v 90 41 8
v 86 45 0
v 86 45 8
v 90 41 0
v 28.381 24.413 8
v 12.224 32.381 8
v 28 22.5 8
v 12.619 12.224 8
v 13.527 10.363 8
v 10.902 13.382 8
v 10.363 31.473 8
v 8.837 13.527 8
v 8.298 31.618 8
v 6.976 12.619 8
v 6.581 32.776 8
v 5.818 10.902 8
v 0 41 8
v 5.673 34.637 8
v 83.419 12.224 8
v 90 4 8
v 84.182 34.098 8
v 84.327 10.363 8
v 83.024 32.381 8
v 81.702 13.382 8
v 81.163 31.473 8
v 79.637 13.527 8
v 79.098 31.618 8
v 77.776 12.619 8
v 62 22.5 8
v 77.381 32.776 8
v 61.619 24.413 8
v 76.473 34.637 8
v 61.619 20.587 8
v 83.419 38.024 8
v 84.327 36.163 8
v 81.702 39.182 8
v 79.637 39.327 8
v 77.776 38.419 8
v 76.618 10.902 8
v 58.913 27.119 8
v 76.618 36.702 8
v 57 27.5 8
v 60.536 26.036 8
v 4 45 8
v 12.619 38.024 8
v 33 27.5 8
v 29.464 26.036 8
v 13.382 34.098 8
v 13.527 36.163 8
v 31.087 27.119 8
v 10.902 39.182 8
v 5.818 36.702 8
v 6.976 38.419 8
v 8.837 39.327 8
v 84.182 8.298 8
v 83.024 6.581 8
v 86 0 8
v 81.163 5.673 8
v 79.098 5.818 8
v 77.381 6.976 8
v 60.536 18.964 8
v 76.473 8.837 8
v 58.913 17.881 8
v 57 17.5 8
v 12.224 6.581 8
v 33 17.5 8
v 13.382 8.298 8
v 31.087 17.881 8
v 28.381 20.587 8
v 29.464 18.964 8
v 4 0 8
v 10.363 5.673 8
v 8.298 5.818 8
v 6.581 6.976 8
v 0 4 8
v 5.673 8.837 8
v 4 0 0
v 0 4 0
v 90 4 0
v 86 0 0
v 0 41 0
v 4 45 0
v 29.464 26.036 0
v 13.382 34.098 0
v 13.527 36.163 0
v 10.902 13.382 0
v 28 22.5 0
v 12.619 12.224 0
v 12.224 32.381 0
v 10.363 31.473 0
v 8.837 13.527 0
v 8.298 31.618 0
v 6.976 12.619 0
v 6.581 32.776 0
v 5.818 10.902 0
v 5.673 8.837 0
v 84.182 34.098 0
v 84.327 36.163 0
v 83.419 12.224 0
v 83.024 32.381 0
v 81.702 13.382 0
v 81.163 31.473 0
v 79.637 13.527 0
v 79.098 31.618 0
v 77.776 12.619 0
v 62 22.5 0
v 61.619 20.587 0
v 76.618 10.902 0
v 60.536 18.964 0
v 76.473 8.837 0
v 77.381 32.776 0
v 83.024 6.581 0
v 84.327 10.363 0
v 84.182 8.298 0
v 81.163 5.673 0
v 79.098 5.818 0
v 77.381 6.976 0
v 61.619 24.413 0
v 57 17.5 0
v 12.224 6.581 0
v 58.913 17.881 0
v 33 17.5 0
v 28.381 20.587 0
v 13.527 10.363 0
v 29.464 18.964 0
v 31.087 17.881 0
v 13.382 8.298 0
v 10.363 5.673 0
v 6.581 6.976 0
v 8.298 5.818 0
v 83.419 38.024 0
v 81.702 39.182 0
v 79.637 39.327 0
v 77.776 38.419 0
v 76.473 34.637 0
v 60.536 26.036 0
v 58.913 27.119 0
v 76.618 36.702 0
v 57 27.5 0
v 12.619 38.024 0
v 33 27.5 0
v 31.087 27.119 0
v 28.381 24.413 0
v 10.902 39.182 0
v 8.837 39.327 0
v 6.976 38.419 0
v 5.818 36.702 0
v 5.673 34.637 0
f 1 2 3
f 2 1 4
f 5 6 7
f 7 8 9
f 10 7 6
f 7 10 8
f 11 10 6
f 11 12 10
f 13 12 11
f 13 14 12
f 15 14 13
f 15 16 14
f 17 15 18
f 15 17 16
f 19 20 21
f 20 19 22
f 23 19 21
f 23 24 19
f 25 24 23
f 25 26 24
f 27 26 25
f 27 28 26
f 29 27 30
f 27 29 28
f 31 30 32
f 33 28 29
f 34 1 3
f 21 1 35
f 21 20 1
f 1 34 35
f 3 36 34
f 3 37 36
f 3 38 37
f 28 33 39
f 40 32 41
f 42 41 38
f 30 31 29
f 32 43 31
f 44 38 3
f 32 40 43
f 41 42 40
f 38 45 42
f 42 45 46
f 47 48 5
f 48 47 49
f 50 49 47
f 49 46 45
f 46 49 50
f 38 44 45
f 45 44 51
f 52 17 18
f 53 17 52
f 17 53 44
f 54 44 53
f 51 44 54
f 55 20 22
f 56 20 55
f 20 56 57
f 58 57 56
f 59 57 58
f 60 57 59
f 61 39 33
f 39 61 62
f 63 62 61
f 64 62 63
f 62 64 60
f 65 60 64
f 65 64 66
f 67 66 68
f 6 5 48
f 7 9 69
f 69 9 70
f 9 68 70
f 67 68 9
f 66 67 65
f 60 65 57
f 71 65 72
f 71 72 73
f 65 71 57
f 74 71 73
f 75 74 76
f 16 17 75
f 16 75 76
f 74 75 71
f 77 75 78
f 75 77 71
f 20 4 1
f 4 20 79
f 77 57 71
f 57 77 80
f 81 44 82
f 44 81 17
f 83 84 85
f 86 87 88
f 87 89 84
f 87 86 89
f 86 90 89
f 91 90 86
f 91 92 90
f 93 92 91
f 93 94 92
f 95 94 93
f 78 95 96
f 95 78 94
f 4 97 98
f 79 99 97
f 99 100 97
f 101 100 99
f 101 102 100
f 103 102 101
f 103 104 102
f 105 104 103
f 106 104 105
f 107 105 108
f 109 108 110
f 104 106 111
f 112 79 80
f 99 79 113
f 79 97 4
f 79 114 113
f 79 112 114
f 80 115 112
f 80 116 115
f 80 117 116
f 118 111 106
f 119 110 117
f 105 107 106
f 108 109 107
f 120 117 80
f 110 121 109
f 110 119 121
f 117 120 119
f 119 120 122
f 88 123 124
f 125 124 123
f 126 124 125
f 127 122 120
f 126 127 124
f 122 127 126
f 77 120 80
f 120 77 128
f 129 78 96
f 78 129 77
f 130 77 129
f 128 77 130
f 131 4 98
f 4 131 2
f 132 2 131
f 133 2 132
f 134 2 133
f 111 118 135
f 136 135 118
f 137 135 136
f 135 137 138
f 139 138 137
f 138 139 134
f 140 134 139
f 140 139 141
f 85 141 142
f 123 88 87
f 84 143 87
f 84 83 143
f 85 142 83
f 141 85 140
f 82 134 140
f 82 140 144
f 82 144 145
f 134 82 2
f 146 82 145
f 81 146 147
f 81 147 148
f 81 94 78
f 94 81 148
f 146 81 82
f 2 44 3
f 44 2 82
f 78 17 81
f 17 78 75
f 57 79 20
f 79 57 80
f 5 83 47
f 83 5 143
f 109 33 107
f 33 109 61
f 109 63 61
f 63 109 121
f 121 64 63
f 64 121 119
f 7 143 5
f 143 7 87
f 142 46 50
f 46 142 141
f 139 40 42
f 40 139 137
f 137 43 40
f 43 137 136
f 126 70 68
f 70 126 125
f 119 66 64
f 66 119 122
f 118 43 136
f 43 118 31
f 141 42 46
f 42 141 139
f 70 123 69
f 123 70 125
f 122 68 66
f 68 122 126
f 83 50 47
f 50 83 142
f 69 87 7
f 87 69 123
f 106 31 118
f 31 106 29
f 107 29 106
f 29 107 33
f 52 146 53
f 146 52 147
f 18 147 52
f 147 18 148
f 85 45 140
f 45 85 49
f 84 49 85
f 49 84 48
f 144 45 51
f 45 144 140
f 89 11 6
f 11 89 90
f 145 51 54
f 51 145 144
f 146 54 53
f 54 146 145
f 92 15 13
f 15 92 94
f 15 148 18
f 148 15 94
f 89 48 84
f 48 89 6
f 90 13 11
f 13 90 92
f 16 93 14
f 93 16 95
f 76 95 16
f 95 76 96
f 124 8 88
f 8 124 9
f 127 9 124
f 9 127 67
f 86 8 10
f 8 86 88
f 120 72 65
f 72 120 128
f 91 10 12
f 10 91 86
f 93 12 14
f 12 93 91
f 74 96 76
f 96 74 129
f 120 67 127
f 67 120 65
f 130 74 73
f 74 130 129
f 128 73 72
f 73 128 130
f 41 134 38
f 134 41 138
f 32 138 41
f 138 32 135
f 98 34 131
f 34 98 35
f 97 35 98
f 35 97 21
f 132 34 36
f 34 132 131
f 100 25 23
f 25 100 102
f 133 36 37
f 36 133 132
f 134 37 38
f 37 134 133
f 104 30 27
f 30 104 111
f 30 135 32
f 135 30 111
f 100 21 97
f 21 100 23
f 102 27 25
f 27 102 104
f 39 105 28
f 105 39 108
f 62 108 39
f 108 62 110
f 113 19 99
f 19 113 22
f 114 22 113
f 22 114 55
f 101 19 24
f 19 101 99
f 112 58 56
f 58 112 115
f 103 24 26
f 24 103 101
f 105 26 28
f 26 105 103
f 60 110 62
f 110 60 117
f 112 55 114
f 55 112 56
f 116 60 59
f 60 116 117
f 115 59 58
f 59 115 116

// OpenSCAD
$fn = 32;

// ----------------------------------------------------------------------
// Bracket plate: slot plate 90 x 45
// ----------------------------------------------------------------------

// --- parameters (mm) ---
hole_r = 4;               // bolt hole radius
plate_t = 8;              // plate thickness, Z (extrusion height)
plate_l = 90;             // plate length
plate_w = 45;             // plate width
slot_l = 24;              // slot straight length
slot_r = 5;               // slot end radius

slot_len = slot_l + 2 * slot_r;
slot_w = 2 * slot_r;
hole_d2 = 2 * hole_r;

profile = [[4, 0], [86, 0], [90, 4], [90, 41], [86, 45], [4, 45], [0, 41], [0, 4]];  // primary outline, 8 points, counter clockwise
void_1 = [[57, 17.5], [58.913, 17.881], [60.536, 18.964], [61.619, 20.587], [62, 22.5], [61.619, 24.413], [60.536, 26.036], [58.913, 27.119], [57, 27.5], [33, 27.5], [31.087, 27.119], [29.464, 26.036], [28.381, 24.413], [28, 22.5], [28.381, 20.587], [29.464, 18.964], [31.087, 17.881], [33, 17.5]];  // grip slot, 18 points
void_2 = [[13.527, 36.163], [12.619, 38.024], [10.902, 39.182], [8.837, 39.327], [6.976, 38.419], [5.818, 36.702], [5.673, 34.637], [6.581, 32.776], [8.298, 31.618], [10.363, 31.473], [12.224, 32.381], [13.382, 34.098]];  // corner hole, 12 points
void_3 = [[13.527, 10.363], [12.619, 12.224], [10.902, 13.382], [8.837, 13.527], [6.976, 12.619], [5.818, 10.902], [5.673, 8.837], [6.581, 6.976], [8.298, 5.818], [10.363, 5.673], [12.224, 6.581], [13.382, 8.298]];  // corner hole, 12 points
void_4 = [[84.327, 36.163], [83.419, 38.024], [81.702, 39.182], [79.637, 39.327], [77.776, 38.419], [76.618, 36.702], [76.473, 34.637], [77.381, 32.776], [79.098, 31.618], [81.163, 31.473], [83.024, 32.381], [84.182, 34.098]];  // corner hole, 12 points
void_5 = [[84.327, 10.363], [83.419, 12.224], [81.702, 13.382], [79.637, 13.527], [77.776, 12.619], [76.618, 10.902], [76.473, 8.837], [77.381, 6.976], [79.098, 5.818], [81.163, 5.673], [83.024, 6.581], [84.182, 8.298]];  // corner hole, 12 points

// --- the one profile operation ---
difference() {
  linear_extrude(height = plate_t) polygon(points = profile);
  translate([0, 0, -1])
    linear_extrude(height = plate_t + 2) polygon(points = void_1);
  translate([0, 0, -1])
    linear_extrude(height = plate_t + 2) polygon(points = void_2);
  translate([0, 0, -1])
    linear_extrude(height = plate_t + 2) polygon(points = void_3);
  translate([0, 0, -1])
    linear_extrude(height = plate_t + 2) polygon(points = void_4);
  translate([0, 0, -1])
    linear_extrude(height = plate_t + 2) polygon(points = void_5);
}
